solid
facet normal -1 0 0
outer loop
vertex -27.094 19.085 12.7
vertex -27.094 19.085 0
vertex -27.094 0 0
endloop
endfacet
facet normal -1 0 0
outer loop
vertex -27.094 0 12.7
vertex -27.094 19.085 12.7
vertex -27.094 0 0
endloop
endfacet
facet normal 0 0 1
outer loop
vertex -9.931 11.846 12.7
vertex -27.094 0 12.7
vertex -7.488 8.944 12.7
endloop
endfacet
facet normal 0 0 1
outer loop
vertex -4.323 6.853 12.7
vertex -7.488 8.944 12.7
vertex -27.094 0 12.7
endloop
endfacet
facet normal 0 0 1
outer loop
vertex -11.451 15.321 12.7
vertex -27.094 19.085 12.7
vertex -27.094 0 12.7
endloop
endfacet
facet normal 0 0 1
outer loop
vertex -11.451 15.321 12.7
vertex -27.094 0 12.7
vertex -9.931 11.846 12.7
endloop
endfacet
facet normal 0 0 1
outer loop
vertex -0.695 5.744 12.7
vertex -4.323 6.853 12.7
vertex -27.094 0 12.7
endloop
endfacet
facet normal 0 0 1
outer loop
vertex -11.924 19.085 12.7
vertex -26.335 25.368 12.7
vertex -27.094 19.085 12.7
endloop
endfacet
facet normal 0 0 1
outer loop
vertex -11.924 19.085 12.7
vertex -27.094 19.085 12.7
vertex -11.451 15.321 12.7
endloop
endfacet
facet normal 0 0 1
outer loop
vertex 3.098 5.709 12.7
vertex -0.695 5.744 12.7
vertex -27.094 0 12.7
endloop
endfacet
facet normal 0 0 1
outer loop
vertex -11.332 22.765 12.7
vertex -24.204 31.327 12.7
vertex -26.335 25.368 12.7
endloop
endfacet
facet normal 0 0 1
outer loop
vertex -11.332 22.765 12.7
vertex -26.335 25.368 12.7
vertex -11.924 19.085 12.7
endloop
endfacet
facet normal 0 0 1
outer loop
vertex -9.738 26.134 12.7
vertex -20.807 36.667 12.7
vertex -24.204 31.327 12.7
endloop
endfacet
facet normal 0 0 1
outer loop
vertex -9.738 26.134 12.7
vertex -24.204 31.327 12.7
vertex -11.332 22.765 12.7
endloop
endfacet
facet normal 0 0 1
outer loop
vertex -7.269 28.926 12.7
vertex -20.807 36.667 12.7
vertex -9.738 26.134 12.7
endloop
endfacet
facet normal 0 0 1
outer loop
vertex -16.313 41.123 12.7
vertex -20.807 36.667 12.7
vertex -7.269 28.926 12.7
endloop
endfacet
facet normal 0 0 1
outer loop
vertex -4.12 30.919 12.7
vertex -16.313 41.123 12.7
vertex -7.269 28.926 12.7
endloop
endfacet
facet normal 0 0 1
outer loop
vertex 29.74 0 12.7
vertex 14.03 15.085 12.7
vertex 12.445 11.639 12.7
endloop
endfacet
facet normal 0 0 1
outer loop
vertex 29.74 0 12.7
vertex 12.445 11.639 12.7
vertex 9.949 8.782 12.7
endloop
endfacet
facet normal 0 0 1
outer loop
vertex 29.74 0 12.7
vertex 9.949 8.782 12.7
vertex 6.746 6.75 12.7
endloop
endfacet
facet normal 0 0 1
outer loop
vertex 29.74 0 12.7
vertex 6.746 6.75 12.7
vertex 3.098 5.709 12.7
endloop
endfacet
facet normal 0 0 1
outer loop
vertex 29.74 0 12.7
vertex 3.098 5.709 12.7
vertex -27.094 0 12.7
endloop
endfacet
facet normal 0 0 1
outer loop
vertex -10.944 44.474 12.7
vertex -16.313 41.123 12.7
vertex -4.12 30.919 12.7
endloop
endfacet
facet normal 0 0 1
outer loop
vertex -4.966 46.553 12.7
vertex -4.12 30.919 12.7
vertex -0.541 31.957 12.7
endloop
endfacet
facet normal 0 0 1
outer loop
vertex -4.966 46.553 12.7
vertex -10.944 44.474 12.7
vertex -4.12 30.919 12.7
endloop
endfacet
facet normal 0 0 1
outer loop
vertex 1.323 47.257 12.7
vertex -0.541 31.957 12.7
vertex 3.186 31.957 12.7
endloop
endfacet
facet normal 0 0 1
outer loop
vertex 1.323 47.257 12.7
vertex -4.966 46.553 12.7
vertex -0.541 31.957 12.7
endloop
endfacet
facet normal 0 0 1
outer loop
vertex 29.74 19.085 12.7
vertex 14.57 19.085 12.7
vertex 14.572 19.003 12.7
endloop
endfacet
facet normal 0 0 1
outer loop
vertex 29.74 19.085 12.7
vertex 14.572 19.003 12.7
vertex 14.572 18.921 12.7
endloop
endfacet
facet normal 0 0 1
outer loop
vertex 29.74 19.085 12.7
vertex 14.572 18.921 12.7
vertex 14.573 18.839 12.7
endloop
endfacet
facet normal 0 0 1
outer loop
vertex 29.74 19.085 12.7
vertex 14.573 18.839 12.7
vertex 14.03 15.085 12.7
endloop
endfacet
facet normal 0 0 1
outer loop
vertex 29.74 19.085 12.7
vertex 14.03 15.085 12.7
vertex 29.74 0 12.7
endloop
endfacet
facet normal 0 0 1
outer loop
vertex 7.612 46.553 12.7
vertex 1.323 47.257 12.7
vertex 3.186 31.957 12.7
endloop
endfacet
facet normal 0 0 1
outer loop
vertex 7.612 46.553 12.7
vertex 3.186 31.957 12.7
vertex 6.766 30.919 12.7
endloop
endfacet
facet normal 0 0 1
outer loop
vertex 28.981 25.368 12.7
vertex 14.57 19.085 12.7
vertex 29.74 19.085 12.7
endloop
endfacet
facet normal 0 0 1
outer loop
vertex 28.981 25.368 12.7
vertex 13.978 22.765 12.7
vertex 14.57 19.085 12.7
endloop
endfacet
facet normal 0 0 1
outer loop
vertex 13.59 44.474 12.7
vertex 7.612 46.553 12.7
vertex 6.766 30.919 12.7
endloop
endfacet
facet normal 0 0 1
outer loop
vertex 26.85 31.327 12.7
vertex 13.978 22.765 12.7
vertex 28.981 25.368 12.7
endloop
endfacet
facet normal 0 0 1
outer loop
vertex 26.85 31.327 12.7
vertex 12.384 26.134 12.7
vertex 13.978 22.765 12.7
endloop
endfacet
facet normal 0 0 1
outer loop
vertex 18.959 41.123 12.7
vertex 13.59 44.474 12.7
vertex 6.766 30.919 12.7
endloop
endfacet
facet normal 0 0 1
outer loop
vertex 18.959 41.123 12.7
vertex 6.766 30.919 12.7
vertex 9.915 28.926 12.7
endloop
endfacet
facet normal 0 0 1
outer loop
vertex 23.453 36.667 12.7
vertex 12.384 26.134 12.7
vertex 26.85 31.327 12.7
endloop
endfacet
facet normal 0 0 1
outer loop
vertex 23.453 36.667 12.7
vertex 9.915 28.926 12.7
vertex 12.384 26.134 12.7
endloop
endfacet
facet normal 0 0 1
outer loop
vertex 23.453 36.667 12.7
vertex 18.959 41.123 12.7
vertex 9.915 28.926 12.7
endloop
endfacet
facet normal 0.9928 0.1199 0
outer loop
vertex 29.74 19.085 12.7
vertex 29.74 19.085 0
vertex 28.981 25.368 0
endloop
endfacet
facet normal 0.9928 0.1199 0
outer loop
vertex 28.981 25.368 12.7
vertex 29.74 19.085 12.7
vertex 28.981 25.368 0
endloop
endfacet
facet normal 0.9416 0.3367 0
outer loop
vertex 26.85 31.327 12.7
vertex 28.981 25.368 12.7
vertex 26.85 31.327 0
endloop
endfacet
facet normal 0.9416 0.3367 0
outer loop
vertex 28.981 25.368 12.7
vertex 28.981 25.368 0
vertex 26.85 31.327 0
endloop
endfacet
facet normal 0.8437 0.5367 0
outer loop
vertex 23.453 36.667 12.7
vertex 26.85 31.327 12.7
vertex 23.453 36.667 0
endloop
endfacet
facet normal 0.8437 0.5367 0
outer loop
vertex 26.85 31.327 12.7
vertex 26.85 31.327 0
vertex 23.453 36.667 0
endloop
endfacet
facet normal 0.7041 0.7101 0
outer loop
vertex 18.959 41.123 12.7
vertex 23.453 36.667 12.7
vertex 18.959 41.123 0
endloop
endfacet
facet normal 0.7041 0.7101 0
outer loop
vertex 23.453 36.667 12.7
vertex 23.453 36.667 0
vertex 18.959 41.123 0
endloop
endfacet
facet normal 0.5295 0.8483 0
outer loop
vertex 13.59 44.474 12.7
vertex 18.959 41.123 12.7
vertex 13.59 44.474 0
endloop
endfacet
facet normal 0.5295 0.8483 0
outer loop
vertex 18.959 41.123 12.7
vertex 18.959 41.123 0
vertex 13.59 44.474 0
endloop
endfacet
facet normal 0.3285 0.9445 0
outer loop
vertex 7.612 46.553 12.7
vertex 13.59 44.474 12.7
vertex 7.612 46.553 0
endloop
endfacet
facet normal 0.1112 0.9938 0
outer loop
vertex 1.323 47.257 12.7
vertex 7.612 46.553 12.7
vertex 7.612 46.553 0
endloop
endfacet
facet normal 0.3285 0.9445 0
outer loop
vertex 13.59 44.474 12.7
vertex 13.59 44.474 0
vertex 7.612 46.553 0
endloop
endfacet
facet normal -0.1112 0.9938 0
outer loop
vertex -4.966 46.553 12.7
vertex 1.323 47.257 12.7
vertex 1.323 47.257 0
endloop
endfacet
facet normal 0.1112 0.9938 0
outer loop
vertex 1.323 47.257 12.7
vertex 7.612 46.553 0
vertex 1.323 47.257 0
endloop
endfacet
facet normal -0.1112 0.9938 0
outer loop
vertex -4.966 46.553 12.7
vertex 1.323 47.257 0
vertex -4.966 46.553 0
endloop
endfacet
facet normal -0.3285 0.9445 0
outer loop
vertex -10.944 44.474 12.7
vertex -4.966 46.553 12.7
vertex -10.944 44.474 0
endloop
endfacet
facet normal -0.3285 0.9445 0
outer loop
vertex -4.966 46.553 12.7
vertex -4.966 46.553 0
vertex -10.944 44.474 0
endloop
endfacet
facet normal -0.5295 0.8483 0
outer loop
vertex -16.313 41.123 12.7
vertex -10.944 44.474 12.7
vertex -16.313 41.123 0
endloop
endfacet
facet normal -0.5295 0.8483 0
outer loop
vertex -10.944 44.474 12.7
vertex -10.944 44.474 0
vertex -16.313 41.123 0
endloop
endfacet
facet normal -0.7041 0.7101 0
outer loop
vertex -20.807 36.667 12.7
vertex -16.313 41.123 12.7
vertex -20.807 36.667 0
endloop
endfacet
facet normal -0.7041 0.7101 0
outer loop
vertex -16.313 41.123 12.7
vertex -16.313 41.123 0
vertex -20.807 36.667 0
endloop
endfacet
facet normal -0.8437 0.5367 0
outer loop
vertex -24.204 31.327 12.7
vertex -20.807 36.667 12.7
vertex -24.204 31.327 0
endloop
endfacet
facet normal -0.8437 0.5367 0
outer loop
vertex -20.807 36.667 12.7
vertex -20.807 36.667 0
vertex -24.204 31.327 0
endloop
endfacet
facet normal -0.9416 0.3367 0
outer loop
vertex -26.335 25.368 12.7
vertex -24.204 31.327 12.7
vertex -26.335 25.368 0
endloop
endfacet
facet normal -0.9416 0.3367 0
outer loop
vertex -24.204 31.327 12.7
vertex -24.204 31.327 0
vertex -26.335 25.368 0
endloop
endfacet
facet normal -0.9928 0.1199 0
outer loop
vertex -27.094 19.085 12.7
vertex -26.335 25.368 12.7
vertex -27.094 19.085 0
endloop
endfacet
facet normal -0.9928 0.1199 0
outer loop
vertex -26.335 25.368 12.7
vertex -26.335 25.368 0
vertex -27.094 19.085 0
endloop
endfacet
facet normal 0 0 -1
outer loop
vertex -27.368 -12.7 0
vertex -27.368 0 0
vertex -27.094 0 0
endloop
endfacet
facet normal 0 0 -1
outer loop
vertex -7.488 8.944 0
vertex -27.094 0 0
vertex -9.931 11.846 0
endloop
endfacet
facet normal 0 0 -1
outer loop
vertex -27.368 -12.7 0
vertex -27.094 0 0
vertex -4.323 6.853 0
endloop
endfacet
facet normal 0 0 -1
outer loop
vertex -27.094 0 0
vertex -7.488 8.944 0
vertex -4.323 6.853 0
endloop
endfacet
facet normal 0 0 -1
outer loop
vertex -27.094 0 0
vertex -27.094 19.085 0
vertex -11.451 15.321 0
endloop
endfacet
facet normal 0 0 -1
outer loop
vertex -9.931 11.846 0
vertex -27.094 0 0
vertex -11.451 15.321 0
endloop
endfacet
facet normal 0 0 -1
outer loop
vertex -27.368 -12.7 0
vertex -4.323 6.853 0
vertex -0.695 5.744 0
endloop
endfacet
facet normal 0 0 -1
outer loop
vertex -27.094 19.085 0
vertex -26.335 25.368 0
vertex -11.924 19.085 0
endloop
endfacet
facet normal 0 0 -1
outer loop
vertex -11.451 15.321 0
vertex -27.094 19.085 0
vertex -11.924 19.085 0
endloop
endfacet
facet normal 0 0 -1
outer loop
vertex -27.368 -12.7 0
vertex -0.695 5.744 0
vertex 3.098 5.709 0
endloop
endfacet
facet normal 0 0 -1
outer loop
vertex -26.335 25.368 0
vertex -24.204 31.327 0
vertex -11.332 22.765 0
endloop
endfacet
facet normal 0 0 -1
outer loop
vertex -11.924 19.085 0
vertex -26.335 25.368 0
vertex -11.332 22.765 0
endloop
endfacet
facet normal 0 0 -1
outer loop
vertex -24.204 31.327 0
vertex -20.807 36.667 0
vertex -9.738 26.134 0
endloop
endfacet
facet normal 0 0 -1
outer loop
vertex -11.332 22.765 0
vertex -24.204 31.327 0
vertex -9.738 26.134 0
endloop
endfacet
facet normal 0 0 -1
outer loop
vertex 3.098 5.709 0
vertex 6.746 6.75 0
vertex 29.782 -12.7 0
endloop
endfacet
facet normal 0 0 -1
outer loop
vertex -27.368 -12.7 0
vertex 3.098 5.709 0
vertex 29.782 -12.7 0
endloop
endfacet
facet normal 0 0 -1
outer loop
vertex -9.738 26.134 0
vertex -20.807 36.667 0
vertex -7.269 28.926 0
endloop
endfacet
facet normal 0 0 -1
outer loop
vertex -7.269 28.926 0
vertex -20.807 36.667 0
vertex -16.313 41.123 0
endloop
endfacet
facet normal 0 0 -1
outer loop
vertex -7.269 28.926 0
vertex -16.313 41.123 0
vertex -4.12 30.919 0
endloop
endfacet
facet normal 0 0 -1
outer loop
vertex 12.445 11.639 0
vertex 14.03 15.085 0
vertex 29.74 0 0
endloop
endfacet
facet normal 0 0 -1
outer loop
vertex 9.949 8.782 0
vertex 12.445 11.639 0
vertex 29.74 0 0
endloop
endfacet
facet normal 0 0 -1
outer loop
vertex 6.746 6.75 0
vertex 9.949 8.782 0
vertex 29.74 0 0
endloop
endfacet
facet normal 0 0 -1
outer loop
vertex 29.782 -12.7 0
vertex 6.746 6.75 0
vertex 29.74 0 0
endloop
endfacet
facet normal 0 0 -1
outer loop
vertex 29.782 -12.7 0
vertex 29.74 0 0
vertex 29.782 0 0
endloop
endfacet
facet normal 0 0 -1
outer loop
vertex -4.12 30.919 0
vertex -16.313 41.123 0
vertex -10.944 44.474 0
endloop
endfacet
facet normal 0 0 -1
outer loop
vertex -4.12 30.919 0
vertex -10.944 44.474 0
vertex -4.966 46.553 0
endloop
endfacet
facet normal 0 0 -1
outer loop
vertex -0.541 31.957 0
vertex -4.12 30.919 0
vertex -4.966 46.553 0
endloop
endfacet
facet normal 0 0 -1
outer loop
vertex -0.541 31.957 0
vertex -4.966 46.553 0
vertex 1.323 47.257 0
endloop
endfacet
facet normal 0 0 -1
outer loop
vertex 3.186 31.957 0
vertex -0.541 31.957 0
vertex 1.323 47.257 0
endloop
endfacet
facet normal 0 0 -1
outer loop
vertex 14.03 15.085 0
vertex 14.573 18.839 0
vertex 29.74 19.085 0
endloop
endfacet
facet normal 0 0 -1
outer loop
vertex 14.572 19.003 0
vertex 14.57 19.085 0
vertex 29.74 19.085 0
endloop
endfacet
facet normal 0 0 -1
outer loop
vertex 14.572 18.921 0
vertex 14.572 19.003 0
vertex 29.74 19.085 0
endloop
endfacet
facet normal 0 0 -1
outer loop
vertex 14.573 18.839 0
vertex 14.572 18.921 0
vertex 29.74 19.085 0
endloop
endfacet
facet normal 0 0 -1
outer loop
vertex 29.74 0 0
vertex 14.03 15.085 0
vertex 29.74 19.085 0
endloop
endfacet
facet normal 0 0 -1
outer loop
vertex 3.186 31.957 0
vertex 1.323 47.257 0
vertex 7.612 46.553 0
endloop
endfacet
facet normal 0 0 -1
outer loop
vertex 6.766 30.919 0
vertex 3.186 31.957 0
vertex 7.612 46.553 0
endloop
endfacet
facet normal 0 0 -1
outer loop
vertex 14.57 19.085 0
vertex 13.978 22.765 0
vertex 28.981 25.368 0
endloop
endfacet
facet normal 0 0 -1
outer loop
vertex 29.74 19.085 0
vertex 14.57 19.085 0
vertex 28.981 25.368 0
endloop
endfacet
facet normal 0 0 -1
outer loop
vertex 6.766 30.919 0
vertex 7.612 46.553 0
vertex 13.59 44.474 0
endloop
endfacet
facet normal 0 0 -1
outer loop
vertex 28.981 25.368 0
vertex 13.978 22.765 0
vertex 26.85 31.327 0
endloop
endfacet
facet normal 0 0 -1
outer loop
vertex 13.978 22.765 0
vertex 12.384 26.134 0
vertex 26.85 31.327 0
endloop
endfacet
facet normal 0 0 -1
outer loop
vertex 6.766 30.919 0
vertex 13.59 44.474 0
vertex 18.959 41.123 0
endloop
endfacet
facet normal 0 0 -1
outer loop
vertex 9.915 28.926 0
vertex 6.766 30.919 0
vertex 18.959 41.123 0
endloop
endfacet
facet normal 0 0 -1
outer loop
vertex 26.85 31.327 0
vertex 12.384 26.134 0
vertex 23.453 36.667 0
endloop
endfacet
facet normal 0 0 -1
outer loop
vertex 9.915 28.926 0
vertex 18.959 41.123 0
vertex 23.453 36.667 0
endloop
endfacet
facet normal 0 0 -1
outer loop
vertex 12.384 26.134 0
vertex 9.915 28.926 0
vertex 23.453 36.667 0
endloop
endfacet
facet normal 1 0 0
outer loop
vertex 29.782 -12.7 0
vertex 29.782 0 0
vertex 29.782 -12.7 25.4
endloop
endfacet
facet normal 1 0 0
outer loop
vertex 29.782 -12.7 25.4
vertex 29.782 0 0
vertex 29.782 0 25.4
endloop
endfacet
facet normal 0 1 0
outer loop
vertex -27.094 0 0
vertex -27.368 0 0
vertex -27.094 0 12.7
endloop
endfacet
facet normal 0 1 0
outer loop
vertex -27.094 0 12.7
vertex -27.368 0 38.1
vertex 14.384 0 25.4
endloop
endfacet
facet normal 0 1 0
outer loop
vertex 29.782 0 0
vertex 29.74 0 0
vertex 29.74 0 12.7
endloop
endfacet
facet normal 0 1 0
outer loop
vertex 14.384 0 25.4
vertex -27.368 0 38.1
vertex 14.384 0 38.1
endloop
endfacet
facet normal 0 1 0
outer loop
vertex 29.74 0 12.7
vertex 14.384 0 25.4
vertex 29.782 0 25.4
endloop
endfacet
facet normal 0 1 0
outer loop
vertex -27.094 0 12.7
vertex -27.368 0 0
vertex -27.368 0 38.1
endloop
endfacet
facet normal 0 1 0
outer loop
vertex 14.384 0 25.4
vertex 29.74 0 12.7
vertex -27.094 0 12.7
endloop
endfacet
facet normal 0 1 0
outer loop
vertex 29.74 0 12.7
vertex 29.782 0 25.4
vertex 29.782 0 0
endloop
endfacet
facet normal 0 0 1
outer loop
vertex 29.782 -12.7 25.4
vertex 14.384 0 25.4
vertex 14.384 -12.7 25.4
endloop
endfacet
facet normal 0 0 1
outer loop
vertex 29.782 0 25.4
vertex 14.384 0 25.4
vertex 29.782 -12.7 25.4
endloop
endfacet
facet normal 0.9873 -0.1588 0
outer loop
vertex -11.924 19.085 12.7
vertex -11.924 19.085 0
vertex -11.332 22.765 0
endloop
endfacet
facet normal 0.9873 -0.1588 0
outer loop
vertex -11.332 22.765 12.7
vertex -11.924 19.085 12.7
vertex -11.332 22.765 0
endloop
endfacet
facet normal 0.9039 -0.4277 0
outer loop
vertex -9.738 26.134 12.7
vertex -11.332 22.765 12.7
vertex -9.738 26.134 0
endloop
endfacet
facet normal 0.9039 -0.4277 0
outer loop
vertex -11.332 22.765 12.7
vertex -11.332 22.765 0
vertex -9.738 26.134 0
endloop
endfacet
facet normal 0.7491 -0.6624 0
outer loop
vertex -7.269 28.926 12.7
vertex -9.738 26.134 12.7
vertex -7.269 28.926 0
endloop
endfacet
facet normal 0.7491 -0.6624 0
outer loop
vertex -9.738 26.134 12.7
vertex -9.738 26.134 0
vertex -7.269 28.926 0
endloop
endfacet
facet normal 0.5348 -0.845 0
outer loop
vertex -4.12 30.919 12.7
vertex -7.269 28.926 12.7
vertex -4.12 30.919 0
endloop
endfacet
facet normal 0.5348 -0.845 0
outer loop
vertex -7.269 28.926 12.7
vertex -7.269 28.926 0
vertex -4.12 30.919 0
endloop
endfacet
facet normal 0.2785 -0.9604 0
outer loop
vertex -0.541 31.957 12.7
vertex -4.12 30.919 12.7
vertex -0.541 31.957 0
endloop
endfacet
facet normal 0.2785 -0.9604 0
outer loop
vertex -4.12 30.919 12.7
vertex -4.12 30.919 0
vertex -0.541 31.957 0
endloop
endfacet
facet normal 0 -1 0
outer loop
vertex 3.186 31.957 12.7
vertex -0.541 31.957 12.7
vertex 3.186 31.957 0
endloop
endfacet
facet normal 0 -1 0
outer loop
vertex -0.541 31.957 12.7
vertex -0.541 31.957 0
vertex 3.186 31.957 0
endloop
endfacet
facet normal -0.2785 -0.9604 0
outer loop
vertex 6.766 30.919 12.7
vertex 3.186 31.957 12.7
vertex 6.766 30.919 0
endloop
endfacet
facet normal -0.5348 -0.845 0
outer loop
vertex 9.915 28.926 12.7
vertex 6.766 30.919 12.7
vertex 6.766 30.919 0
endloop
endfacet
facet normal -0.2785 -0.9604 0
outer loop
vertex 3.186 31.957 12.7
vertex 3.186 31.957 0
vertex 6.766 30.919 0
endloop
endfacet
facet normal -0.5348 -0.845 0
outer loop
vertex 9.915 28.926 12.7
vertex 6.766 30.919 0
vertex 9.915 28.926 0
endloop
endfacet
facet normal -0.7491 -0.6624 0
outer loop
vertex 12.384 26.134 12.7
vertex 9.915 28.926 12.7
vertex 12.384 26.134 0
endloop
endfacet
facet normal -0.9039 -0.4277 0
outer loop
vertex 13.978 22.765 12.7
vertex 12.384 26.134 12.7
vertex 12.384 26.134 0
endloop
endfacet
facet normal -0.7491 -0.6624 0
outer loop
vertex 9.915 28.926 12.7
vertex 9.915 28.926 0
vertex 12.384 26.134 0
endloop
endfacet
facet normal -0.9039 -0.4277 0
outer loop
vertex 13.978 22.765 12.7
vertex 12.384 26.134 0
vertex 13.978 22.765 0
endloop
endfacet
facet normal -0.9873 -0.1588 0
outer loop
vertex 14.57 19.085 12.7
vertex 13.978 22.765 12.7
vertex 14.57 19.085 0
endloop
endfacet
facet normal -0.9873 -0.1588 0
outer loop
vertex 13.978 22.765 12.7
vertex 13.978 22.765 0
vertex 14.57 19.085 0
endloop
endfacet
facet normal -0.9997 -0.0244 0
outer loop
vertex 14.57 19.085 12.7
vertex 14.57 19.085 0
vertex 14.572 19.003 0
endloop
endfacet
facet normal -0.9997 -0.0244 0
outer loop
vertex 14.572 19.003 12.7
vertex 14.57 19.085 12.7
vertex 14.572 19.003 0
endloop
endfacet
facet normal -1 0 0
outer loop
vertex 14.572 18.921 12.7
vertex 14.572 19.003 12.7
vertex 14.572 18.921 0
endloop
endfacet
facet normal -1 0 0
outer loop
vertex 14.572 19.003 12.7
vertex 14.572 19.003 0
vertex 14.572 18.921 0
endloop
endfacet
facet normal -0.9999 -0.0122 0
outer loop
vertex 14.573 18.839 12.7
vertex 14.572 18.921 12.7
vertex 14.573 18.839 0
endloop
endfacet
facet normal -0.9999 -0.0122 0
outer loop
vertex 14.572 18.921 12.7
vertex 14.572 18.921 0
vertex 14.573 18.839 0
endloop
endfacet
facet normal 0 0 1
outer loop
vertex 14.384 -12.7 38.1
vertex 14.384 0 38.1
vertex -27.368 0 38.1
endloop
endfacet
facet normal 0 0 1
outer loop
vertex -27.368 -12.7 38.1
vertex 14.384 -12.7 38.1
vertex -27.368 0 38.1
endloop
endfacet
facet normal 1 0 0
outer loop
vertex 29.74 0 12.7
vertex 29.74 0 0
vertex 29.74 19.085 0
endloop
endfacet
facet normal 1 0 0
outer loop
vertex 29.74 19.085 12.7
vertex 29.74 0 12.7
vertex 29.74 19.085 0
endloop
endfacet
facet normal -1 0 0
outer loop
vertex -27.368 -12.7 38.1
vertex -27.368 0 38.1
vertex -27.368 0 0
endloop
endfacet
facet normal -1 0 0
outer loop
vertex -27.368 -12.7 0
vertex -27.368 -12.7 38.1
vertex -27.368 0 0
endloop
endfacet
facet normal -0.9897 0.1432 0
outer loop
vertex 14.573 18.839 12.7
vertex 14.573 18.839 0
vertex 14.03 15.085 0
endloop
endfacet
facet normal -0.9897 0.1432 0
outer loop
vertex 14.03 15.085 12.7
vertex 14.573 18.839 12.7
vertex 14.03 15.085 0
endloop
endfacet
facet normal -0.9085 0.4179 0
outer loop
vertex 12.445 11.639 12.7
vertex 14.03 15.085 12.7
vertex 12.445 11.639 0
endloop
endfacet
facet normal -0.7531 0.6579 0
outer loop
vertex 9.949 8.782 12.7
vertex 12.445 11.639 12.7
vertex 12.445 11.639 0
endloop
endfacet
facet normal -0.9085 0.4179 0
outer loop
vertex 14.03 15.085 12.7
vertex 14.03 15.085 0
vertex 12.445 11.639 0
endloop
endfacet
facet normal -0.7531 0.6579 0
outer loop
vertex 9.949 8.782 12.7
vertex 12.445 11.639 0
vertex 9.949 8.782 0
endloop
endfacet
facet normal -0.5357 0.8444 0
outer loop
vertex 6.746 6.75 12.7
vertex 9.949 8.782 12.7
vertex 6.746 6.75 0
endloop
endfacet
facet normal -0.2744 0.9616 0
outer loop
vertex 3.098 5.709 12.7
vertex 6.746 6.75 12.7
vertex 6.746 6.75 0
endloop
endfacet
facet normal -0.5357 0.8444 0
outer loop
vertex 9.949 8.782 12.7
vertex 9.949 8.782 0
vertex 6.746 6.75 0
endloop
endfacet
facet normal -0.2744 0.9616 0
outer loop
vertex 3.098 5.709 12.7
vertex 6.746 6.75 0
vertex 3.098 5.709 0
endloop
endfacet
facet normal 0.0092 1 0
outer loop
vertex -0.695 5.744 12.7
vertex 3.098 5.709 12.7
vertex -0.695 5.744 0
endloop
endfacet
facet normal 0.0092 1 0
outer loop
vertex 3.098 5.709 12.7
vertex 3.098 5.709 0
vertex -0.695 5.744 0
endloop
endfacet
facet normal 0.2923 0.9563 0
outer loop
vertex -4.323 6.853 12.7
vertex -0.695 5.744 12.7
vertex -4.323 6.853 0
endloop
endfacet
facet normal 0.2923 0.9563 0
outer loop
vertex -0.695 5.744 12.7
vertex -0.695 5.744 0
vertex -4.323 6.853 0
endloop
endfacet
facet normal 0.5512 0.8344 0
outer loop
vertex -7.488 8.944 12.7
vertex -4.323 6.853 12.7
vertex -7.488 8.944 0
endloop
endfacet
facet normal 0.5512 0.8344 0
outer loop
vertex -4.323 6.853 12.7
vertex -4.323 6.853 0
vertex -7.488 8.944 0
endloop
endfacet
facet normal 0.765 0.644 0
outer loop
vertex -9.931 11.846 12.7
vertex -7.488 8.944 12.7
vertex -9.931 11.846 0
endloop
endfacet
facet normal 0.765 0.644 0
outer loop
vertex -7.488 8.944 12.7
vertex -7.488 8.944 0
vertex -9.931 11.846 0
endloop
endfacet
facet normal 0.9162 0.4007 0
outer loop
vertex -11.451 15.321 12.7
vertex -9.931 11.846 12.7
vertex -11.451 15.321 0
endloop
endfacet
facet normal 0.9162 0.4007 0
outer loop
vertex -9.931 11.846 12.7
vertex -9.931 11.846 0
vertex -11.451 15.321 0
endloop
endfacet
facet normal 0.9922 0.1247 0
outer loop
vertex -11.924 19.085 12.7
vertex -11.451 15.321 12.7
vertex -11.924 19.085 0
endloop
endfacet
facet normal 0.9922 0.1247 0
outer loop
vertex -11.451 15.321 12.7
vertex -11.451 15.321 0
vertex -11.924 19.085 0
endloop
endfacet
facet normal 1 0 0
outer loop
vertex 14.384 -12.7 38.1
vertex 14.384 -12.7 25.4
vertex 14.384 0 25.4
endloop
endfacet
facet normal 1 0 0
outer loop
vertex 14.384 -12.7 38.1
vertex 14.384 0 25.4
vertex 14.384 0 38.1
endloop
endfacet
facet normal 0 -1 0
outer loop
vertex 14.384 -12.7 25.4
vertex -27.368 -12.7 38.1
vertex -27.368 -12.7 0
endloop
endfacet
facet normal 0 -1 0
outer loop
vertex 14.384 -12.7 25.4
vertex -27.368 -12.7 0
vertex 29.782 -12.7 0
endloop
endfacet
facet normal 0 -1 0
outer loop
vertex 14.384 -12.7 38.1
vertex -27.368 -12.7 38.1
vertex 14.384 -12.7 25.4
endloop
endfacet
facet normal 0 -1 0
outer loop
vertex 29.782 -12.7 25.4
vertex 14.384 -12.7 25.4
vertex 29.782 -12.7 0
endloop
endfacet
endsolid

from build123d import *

# Parameters (mm, degrees)
F0_W     = 15.3987973437
F0_H     = 25.4
F1_DEPTH = 12.7
F3_DEPTH = 12.7


with BuildPart() as f1:
    # F0 (on Front) → F1 (new body)
    with BuildSketch(Plane.XZ):
        Polygon((-27.3676061763, 38.1), (-27.3676061763, 0), (14.38359648, 0), (14.38359648, 25.4), (14.38359648, 38.1), align=None)
        with Locations((22.0829951519, 12.7)):
            Rectangle(F0_W, F0_H)
    extrude(amount=F1_DEPTH)

    # F2 (on Top) → F3 (join)
    with BuildSketch(Plane.XY):
        with BuildLine():
            ThreePointArc((29.7399014235, 19.0850179642), (1.3229484896, 47.2574464843), (-27.0940044443, 19.0850179642))
            Line((-27.0940044443, 19.0850179642), (-11.9244960211, 19.0850179642))
            ThreePointArc((-11.9244960211, 19.0850179642), (1.3229484896, 32.0891530572), (14.5703930003, 19.0850179642))
            Line((14.5703930003, 19.0850179642), (29.7399014235, 19.0850179642))
        make_face()
        with BuildLine():
            ThreePointArc((-27.0940044443, 18.5938467712), (-25.2058095454, 8.6507855756), (-19.9528432558, 0))
            Line((-19.9528432558, 0), (22.598740235, 0))
            ThreePointArc((22.598740235, 0), (27.8517065245, 8.6507855756), (29.7399014235, 18.5938467712))
            Line((29.7399014235, 18.5938467712), (29.7399014235, 19.0850179642))
            Line((29.7399014235, 19.0850179642), (14.5703930003, 19.0850179642))
            ThreePointArc((14.5703930003, 19.0850179642), (14.5721001221, 18.96223044), (14.5726691791, 18.8394323677))
            ThreePointArc((14.5726691791, 18.8394323677), (1.2001504173, 5.5902807351), (-11.9244960211, 19.0850179642))
            Line((-11.9244960211, 19.0850179642), (-27.0940044443, 19.0850179642))
            Line((-27.0940044443, 19.0850179642), (-27.0940044443, 18.5938467712))
        make_face()
        with BuildLine():
            ThreePointArc((29.7399014235, 18.5938467712), (27.8517065245, 8.6507855756), (22.598740235, 0))
            Line((22.598740235, 0), (29.7399014235, 0))
            Line((29.7399014235, 0), (29.7399014235, 18.5938467712))
        make_face()
        with BuildLine():
            Line((-27.0940044443, 18.5938467712), (-27.0940044443, 0))
            Line((-27.0940044443, 0), (-19.9528432558, 0))
            ThreePointArc((-19.9528432558, 0), (-25.2058095454, 8.6507855756), (-27.0940044443, 18.5938467712))
        make_face()
    extrude(amount=F3_DEPTH)


solid = f1.part
